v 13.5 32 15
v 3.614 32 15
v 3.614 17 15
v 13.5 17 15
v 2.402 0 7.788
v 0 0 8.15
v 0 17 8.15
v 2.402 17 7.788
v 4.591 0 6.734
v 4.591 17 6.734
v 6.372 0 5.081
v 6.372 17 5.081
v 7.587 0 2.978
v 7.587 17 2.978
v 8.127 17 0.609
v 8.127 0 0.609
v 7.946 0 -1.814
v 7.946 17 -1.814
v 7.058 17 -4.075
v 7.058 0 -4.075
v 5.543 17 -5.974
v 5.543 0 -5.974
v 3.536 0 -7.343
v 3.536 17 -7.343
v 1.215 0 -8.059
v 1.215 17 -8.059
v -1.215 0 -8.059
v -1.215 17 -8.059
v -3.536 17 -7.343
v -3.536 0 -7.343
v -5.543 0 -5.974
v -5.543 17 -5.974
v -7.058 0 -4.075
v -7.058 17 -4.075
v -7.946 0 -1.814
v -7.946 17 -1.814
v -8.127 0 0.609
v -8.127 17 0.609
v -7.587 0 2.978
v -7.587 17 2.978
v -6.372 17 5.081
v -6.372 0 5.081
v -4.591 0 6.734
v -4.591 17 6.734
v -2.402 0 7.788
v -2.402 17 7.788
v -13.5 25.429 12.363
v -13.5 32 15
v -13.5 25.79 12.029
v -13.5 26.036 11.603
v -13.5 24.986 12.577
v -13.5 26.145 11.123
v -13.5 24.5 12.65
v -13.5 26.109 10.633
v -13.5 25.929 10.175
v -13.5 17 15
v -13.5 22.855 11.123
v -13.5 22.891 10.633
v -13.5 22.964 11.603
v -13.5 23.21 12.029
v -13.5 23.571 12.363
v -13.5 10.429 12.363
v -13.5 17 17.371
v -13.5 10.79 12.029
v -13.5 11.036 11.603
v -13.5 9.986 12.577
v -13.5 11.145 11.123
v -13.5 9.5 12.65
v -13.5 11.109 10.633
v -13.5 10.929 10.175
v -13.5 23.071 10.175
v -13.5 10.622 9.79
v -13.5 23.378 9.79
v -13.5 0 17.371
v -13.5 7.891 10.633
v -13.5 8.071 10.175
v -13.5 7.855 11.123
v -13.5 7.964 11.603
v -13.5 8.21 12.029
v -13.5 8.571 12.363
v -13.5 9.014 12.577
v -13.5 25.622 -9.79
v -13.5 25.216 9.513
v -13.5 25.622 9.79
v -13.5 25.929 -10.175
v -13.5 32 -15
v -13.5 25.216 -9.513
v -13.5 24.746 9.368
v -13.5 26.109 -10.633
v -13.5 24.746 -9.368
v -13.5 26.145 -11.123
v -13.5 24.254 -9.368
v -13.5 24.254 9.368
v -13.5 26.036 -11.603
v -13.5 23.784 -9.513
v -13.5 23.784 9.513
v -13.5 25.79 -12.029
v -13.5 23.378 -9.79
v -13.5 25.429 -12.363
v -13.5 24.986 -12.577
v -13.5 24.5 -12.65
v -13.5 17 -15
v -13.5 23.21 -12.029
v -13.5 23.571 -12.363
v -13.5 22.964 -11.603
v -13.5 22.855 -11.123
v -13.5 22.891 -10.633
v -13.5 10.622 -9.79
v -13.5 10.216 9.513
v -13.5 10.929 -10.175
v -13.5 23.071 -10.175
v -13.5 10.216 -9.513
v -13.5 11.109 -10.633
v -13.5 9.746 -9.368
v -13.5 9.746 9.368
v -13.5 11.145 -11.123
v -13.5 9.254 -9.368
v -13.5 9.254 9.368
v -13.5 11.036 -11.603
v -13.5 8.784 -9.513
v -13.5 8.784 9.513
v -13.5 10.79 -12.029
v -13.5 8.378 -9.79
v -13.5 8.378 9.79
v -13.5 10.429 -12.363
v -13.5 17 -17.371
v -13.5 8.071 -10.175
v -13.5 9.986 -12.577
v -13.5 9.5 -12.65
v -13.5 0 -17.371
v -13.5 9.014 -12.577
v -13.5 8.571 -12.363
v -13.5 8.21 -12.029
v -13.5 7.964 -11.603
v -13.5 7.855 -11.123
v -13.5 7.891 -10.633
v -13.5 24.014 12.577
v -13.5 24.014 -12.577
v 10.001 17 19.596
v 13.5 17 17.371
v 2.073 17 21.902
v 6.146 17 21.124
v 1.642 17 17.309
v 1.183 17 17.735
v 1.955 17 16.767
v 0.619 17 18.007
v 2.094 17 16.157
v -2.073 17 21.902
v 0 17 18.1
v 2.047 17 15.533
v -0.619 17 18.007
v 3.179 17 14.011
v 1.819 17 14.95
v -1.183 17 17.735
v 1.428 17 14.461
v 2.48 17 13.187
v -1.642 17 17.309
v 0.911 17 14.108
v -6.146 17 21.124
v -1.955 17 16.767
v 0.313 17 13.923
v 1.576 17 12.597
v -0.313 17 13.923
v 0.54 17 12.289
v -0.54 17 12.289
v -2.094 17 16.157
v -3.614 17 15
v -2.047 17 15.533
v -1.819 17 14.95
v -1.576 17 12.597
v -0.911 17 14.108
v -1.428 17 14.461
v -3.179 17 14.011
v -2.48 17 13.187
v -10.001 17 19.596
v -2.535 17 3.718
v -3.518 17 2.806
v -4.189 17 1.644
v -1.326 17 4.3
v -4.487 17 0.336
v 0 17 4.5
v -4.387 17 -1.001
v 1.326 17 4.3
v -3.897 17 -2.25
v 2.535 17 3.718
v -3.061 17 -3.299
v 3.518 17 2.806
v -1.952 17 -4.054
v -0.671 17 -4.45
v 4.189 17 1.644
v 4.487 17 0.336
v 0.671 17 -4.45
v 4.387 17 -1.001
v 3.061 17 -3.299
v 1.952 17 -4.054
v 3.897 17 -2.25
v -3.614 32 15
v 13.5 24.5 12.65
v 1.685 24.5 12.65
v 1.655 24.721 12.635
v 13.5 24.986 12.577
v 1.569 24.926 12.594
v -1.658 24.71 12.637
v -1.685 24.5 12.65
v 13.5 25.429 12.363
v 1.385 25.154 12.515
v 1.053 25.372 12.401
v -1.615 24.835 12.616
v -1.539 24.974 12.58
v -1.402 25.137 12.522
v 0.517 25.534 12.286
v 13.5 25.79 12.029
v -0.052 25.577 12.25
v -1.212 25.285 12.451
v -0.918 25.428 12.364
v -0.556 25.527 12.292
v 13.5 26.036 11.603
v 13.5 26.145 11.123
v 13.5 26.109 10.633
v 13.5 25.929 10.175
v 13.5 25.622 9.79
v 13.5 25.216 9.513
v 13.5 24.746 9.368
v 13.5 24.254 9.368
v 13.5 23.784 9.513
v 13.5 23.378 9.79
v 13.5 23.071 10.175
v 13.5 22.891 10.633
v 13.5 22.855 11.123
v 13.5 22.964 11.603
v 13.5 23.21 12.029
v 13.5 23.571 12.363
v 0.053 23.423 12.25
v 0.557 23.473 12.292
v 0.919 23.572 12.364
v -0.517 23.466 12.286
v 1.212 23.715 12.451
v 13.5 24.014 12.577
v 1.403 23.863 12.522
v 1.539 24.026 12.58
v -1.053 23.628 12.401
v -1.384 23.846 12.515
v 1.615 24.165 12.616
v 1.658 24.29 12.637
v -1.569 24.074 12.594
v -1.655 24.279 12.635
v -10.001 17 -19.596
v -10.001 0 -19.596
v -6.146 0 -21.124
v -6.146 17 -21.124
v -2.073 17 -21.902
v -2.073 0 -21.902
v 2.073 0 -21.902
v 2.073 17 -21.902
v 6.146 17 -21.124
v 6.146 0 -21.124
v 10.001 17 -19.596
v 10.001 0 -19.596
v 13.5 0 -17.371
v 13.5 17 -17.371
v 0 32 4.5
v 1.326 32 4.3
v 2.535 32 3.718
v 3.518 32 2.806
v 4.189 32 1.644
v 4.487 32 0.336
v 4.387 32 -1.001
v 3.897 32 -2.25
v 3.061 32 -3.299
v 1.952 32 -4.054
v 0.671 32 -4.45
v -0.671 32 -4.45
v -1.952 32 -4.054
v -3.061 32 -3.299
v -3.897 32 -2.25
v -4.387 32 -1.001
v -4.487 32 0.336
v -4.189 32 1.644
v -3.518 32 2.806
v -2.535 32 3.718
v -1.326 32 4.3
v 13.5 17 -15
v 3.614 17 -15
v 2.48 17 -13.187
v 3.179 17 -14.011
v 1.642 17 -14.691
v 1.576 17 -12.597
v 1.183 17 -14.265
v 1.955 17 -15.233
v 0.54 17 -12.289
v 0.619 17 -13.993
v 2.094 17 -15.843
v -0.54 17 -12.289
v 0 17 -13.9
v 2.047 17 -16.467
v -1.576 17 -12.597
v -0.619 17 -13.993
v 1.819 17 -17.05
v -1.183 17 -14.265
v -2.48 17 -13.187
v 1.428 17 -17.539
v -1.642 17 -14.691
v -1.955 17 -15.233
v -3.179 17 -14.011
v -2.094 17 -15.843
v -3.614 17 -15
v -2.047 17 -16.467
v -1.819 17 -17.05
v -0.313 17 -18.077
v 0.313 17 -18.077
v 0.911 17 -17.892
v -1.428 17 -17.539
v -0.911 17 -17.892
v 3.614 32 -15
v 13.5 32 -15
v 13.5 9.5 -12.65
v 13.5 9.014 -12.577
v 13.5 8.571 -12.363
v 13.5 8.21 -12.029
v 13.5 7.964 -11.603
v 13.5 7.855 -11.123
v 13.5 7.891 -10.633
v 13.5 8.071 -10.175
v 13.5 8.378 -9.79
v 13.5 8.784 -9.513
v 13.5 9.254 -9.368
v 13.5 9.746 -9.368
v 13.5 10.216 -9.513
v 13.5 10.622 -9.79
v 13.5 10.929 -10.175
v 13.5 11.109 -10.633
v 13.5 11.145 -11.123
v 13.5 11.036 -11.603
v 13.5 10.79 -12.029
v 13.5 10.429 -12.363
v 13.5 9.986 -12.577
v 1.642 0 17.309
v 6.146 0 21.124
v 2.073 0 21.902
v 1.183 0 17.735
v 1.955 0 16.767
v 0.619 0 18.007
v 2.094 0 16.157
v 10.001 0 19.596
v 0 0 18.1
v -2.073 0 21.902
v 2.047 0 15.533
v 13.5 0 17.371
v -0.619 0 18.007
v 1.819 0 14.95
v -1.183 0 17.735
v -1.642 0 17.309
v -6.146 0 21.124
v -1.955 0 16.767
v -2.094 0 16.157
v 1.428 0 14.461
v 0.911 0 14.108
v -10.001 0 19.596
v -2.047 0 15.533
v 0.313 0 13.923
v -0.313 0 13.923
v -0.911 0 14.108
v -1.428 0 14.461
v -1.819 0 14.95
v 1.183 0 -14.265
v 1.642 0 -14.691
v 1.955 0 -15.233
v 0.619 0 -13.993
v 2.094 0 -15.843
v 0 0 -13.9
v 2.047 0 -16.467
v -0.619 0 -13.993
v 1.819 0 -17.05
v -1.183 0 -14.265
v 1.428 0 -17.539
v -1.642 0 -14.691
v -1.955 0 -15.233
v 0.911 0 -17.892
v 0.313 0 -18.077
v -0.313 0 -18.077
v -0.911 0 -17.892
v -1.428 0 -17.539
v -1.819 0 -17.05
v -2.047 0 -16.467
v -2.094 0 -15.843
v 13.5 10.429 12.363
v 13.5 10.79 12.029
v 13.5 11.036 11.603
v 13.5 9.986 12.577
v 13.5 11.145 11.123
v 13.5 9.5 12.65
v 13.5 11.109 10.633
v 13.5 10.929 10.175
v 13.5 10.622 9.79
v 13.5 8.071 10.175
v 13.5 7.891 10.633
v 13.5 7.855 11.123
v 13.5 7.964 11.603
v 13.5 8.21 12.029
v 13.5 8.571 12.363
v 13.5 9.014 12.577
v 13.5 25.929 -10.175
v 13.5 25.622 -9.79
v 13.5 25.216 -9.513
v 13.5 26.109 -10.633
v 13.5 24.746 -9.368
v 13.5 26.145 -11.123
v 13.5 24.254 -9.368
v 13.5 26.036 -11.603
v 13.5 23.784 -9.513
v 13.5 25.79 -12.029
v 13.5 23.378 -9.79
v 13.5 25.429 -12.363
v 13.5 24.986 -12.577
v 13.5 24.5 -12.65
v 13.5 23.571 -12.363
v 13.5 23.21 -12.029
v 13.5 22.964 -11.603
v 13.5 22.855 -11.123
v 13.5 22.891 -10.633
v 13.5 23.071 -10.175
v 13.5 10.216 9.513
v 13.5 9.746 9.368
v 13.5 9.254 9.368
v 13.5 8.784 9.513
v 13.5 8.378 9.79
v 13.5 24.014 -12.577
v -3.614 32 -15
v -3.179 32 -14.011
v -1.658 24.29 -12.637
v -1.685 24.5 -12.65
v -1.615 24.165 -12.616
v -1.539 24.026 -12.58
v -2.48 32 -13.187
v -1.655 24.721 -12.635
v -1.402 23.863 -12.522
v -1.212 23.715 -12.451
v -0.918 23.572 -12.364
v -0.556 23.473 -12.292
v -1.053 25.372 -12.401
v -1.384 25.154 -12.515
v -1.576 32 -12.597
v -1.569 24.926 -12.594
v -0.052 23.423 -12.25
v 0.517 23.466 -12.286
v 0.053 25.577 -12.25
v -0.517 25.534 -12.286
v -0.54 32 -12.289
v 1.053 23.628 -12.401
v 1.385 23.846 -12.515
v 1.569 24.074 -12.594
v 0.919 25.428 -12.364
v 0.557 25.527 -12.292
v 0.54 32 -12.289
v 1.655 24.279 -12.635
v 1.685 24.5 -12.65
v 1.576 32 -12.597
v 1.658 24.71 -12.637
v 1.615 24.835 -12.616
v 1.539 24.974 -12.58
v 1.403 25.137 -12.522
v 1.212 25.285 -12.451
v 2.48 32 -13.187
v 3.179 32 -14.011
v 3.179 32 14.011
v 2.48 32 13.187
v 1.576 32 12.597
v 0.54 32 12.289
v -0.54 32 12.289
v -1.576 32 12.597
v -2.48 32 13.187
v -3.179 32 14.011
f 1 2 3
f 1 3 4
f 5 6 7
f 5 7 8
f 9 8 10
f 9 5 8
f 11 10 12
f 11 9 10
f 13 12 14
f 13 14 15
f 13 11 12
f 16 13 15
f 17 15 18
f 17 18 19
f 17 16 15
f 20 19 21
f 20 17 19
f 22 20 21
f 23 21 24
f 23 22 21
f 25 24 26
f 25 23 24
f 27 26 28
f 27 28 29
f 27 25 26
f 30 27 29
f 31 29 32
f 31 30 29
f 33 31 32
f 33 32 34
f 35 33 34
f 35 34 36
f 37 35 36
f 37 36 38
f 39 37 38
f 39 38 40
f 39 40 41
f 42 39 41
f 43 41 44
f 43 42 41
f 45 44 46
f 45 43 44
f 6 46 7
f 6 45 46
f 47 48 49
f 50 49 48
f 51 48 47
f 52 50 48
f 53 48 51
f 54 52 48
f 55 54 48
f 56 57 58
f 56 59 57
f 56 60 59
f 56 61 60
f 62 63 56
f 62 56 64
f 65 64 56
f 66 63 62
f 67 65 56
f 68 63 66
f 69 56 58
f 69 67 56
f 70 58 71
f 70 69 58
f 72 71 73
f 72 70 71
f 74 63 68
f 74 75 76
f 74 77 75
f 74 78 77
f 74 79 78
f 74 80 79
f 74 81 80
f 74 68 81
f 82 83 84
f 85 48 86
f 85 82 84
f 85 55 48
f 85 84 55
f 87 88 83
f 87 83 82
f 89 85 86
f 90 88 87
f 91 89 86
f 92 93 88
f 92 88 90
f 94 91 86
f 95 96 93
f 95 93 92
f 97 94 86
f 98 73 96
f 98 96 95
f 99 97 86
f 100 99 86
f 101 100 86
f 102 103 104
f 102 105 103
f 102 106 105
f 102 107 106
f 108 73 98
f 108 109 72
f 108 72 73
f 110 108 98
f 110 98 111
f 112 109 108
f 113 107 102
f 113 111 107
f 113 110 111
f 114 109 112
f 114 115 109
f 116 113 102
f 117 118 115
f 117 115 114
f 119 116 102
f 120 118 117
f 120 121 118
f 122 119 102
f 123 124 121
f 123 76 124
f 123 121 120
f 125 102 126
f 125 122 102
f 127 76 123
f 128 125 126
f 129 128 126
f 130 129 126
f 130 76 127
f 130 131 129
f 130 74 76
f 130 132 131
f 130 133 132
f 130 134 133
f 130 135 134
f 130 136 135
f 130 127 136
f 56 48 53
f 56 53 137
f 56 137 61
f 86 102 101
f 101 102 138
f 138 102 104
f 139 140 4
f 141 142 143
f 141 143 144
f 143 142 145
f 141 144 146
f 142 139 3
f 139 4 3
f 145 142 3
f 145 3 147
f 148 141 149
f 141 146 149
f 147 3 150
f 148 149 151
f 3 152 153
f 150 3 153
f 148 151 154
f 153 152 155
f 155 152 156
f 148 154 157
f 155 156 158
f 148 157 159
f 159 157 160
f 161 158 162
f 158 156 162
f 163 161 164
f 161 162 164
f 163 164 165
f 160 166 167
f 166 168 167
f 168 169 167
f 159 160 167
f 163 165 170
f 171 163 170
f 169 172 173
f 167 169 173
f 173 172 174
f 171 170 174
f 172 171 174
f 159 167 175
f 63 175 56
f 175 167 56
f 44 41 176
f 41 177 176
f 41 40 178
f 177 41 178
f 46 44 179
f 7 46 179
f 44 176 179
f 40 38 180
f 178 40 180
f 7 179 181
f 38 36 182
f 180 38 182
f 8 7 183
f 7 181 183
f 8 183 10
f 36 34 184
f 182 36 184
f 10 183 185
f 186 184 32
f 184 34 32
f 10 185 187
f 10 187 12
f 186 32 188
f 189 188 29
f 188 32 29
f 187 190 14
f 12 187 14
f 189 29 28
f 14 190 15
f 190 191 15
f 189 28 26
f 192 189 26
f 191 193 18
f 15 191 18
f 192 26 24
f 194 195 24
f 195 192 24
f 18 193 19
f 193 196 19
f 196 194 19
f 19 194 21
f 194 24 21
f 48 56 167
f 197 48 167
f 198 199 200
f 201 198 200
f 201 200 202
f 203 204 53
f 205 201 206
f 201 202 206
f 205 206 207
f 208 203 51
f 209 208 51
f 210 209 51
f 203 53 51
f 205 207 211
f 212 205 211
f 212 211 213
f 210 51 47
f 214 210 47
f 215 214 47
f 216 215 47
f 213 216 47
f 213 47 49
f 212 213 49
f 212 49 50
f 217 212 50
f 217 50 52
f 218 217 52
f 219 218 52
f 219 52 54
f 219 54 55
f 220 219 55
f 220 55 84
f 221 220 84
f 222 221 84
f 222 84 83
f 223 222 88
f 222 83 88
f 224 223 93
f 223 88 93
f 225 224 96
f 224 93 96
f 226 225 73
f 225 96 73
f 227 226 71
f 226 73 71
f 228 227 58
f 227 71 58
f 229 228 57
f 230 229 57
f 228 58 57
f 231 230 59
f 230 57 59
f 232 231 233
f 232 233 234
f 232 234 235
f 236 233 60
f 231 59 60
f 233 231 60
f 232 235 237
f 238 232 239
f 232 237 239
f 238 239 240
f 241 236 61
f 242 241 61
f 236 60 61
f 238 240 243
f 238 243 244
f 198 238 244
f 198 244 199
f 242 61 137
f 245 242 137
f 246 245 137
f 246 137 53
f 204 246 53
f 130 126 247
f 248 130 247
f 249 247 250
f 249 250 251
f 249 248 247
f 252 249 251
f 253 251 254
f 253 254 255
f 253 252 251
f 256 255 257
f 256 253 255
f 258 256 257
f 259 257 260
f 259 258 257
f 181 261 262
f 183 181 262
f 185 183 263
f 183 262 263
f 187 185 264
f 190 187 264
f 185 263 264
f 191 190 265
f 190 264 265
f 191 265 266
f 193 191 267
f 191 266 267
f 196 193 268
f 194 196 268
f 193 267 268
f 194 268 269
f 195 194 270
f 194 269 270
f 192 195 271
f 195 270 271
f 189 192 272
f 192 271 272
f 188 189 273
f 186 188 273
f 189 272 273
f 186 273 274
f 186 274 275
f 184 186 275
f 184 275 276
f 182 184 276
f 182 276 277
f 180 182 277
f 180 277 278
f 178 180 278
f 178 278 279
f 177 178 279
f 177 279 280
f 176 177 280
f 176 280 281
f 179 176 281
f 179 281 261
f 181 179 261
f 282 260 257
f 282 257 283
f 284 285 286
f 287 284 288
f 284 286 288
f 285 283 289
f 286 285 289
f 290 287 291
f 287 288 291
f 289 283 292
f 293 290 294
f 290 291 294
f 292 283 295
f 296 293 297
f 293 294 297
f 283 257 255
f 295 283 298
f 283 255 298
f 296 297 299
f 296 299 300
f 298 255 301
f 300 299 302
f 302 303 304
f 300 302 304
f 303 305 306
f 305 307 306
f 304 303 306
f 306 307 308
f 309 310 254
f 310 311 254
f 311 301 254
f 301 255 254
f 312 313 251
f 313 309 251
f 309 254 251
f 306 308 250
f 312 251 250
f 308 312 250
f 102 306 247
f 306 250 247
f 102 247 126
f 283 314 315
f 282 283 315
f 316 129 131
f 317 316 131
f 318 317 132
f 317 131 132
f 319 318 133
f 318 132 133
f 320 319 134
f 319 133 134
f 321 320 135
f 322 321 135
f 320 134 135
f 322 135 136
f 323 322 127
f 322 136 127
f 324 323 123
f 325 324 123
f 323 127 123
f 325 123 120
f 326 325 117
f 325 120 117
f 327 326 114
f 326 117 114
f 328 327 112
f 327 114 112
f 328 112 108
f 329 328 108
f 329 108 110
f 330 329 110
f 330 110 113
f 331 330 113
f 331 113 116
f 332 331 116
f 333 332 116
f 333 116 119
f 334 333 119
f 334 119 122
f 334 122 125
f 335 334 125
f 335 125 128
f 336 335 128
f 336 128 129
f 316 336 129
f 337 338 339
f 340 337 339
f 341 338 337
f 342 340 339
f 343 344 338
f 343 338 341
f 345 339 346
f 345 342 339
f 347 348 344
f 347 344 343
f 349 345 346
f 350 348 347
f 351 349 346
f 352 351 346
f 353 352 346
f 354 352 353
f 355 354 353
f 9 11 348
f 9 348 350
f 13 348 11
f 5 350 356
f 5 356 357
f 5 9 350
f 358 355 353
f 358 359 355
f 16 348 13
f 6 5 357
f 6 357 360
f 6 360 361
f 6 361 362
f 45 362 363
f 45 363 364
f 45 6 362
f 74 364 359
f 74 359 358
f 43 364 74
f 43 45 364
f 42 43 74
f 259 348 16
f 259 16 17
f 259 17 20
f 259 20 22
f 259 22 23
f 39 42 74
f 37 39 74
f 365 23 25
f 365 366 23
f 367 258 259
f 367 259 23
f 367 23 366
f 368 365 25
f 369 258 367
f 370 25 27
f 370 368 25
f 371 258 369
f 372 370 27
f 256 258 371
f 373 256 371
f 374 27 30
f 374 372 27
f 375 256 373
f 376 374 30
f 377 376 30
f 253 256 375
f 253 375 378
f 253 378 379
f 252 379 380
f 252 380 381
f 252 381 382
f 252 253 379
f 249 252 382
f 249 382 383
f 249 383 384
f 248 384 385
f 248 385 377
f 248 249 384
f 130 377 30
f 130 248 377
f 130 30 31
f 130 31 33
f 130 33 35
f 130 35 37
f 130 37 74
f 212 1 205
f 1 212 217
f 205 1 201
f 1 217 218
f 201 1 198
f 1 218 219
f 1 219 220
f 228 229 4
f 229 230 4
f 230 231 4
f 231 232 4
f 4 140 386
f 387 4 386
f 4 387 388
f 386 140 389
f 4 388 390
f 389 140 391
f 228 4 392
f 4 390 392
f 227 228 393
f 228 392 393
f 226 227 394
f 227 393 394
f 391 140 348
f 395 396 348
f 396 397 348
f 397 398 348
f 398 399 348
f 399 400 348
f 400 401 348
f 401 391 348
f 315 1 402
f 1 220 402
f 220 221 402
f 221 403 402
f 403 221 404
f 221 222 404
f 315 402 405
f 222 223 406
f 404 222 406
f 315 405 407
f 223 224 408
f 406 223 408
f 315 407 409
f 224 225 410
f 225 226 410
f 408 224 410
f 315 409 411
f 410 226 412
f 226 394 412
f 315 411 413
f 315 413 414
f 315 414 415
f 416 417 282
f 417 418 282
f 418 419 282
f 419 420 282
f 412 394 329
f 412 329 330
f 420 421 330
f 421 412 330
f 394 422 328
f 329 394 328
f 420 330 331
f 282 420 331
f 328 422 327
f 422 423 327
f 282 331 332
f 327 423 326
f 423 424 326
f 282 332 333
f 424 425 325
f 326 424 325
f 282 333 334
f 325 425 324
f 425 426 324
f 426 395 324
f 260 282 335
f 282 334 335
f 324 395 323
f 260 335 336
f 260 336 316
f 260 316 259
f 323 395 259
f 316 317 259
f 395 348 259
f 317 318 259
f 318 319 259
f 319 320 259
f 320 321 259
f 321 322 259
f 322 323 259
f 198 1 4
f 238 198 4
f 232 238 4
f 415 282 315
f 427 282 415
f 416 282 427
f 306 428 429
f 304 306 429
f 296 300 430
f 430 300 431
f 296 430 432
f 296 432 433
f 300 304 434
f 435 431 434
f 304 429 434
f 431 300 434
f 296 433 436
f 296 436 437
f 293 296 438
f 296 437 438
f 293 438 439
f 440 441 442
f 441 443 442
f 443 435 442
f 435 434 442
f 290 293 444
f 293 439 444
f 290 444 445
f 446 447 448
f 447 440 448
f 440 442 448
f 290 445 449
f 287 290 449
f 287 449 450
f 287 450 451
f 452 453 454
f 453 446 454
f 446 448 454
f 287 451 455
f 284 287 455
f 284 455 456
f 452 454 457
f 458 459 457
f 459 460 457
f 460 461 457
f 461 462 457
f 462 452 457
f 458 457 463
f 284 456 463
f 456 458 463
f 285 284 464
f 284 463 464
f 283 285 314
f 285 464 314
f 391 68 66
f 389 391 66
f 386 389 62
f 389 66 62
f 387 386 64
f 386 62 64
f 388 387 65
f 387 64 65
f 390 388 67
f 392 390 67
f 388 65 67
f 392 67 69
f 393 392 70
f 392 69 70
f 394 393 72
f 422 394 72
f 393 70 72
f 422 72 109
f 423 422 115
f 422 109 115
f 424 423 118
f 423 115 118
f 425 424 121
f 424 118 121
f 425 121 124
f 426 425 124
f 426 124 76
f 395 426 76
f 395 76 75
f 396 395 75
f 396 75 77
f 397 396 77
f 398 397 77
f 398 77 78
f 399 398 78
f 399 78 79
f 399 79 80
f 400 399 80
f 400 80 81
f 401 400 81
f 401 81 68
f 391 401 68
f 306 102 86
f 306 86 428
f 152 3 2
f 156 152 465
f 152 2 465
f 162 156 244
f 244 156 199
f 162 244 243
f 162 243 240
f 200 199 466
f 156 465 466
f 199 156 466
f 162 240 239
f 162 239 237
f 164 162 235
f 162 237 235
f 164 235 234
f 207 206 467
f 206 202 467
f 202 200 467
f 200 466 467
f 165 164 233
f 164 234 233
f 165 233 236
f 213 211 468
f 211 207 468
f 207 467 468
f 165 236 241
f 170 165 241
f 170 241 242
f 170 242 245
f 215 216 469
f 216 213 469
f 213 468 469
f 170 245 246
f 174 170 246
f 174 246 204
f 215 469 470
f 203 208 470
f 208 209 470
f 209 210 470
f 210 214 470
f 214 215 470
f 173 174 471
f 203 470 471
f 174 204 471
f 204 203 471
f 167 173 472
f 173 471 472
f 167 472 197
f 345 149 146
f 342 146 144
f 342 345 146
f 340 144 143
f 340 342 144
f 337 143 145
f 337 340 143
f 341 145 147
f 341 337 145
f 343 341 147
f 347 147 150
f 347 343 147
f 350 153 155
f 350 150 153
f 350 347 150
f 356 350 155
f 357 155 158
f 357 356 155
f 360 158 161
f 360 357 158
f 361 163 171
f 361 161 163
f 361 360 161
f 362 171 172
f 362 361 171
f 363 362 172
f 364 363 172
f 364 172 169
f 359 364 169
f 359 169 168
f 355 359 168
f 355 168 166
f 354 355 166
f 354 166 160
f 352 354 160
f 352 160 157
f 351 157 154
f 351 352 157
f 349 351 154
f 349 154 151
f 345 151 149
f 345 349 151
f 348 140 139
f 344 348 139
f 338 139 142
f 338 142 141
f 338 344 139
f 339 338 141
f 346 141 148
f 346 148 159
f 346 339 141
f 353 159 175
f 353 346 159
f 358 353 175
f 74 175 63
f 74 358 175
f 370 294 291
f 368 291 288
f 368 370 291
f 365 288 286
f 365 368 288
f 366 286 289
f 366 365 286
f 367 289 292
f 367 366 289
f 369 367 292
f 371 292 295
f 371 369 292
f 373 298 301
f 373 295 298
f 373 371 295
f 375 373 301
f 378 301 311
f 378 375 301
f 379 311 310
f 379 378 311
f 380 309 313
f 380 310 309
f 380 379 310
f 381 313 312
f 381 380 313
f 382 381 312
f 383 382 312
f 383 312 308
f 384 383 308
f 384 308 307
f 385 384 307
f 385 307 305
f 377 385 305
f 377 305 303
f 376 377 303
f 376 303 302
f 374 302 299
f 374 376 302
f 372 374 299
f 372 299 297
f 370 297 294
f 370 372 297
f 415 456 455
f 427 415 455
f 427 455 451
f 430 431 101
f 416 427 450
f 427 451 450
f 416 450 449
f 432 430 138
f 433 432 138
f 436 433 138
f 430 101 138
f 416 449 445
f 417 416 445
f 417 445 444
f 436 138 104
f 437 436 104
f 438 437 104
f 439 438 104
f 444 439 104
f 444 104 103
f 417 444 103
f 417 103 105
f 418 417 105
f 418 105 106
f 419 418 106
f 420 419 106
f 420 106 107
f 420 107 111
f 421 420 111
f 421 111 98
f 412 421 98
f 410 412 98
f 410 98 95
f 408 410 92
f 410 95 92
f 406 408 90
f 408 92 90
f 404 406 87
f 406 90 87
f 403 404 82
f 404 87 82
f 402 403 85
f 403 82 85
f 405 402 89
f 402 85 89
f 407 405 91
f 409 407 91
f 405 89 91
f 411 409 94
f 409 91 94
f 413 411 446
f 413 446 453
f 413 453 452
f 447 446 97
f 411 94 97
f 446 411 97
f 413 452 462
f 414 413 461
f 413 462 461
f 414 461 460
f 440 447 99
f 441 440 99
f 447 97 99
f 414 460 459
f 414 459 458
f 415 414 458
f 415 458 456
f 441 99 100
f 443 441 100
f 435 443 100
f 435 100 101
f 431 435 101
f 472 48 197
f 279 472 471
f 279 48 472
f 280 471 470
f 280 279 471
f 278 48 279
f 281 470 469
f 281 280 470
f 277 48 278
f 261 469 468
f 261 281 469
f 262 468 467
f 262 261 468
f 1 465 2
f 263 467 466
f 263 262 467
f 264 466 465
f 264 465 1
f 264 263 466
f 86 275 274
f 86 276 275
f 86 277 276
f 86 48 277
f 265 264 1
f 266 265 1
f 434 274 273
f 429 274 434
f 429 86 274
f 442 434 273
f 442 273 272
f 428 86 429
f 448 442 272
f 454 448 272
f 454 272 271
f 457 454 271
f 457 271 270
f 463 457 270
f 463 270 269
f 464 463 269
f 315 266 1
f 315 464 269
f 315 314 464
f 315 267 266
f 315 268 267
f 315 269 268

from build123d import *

# Parameters (mm, degrees)
SKETCH_1_R          = 2.1
SKETCH_1_R_2        = 8.15
EXTRUDE_1_DEPTH     = 17
SKETCH_2_W          = 27
SKETCH_2_H          = 30
EXTRUDE_2_DEPTH     = 15
SKETCH_3_R          = 3.75
CUT_EXTRUDE_2_DEPTH = 15
SKETCH_4_R          = 1.65
CUT_EXTRUDE_3_DEPTH = 48.296934362
SKETCH_5_R          = 4.5
CUT_EXTRUDE_4_DEPTH = 42.112650154


with BuildPart() as part:
    # 草图1 → 凸台-拉伸1 (new body)
    with BuildSketch(Plane(origin=(0, 0, 0), x_dir=(1, 0, 0), z_dir=(0, 1, 0))):
        with BuildLine():
            Line((-13.5, -17.370952766), (-13.5, 17.370952766))
            ThreePointArc((-13.5, 17.370952766), (0, 22), (13.5, 17.370952766))
            Line((13.5, 17.370952766), (13.5, -17.370952766))
            ThreePointArc((13.5, -17.370952766), (0, -22), (-13.5, -17.370952766))
        make_face()
        with Locations(Location((0, 16, 0), (0, 0, 270))):
            Circle(SKETCH_1_R, mode=Mode.SUBTRACT)
        with Locations(Location((0, -16, 0), (0, 0, 270))):
            Circle(SKETCH_1_R, mode=Mode.SUBTRACT)
        with Locations(Location((0, 0, 0), (0, 0, 270))):
            Circle(SKETCH_1_R_2, mode=Mode.SUBTRACT)
    extrude(amount=EXTRUDE_1_DEPTH)

    # 草图2 → 凸台-拉伸2 (add)
    with BuildSketch(Plane(origin=(0, 17, 0), x_dir=(1, 0, 0), z_dir=(0, 1, 0))):
        Rectangle(SKETCH_2_W, SKETCH_2_H)
    extrude(amount=EXTRUDE_2_DEPTH)

    # 草图3 → 切除-拉伸2 (cut)
    with BuildSketch(Plane(origin=(0, 32, 0), x_dir=(1, 0, 0), z_dir=(0, 1, 0))):
        with Locations((0, 16)):
            Circle(SKETCH_3_R)
        with Locations((0, -16)):
            Circle(SKETCH_3_R)
    extrude(amount=-CUT_EXTRUDE_2_DEPTH, mode=Mode.SUBTRACT)

    # 草图4 → 切除-拉伸3 (cut, through all)
    with BuildSketch(Plane.ZY.offset(13.5)):
        with Locations((11, 24.5)):
            Circle(SKETCH_4_R)
        with Locations(Location((-11, 24.5, 0), (0, 0, 180))):
            Circle(SKETCH_4_R)
        with Locations((11, 9.5)):
            Circle(SKETCH_4_R)
        with Locations(Location((-11, 9.5, 0), (0, 0, 180))):
            Circle(SKETCH_4_R)
    extrude(amount=-CUT_EXTRUDE_3_DEPTH, mode=Mode.SUBTRACT)

    # 草图5 → 切除-拉伸4 (cut, through all)
    with BuildSketch(Plane(origin=(0, 32, 0), x_dir=(1, 0, 0), z_dir=(0, 1, 0))):
        with Locations(Location((0, 0, 0), (0, 0, 270))):
            Circle(SKETCH_5_R)
    extrude(amount=-CUT_EXTRUDE_4_DEPTH, mode=Mode.SUBTRACT)


solid = part.part
